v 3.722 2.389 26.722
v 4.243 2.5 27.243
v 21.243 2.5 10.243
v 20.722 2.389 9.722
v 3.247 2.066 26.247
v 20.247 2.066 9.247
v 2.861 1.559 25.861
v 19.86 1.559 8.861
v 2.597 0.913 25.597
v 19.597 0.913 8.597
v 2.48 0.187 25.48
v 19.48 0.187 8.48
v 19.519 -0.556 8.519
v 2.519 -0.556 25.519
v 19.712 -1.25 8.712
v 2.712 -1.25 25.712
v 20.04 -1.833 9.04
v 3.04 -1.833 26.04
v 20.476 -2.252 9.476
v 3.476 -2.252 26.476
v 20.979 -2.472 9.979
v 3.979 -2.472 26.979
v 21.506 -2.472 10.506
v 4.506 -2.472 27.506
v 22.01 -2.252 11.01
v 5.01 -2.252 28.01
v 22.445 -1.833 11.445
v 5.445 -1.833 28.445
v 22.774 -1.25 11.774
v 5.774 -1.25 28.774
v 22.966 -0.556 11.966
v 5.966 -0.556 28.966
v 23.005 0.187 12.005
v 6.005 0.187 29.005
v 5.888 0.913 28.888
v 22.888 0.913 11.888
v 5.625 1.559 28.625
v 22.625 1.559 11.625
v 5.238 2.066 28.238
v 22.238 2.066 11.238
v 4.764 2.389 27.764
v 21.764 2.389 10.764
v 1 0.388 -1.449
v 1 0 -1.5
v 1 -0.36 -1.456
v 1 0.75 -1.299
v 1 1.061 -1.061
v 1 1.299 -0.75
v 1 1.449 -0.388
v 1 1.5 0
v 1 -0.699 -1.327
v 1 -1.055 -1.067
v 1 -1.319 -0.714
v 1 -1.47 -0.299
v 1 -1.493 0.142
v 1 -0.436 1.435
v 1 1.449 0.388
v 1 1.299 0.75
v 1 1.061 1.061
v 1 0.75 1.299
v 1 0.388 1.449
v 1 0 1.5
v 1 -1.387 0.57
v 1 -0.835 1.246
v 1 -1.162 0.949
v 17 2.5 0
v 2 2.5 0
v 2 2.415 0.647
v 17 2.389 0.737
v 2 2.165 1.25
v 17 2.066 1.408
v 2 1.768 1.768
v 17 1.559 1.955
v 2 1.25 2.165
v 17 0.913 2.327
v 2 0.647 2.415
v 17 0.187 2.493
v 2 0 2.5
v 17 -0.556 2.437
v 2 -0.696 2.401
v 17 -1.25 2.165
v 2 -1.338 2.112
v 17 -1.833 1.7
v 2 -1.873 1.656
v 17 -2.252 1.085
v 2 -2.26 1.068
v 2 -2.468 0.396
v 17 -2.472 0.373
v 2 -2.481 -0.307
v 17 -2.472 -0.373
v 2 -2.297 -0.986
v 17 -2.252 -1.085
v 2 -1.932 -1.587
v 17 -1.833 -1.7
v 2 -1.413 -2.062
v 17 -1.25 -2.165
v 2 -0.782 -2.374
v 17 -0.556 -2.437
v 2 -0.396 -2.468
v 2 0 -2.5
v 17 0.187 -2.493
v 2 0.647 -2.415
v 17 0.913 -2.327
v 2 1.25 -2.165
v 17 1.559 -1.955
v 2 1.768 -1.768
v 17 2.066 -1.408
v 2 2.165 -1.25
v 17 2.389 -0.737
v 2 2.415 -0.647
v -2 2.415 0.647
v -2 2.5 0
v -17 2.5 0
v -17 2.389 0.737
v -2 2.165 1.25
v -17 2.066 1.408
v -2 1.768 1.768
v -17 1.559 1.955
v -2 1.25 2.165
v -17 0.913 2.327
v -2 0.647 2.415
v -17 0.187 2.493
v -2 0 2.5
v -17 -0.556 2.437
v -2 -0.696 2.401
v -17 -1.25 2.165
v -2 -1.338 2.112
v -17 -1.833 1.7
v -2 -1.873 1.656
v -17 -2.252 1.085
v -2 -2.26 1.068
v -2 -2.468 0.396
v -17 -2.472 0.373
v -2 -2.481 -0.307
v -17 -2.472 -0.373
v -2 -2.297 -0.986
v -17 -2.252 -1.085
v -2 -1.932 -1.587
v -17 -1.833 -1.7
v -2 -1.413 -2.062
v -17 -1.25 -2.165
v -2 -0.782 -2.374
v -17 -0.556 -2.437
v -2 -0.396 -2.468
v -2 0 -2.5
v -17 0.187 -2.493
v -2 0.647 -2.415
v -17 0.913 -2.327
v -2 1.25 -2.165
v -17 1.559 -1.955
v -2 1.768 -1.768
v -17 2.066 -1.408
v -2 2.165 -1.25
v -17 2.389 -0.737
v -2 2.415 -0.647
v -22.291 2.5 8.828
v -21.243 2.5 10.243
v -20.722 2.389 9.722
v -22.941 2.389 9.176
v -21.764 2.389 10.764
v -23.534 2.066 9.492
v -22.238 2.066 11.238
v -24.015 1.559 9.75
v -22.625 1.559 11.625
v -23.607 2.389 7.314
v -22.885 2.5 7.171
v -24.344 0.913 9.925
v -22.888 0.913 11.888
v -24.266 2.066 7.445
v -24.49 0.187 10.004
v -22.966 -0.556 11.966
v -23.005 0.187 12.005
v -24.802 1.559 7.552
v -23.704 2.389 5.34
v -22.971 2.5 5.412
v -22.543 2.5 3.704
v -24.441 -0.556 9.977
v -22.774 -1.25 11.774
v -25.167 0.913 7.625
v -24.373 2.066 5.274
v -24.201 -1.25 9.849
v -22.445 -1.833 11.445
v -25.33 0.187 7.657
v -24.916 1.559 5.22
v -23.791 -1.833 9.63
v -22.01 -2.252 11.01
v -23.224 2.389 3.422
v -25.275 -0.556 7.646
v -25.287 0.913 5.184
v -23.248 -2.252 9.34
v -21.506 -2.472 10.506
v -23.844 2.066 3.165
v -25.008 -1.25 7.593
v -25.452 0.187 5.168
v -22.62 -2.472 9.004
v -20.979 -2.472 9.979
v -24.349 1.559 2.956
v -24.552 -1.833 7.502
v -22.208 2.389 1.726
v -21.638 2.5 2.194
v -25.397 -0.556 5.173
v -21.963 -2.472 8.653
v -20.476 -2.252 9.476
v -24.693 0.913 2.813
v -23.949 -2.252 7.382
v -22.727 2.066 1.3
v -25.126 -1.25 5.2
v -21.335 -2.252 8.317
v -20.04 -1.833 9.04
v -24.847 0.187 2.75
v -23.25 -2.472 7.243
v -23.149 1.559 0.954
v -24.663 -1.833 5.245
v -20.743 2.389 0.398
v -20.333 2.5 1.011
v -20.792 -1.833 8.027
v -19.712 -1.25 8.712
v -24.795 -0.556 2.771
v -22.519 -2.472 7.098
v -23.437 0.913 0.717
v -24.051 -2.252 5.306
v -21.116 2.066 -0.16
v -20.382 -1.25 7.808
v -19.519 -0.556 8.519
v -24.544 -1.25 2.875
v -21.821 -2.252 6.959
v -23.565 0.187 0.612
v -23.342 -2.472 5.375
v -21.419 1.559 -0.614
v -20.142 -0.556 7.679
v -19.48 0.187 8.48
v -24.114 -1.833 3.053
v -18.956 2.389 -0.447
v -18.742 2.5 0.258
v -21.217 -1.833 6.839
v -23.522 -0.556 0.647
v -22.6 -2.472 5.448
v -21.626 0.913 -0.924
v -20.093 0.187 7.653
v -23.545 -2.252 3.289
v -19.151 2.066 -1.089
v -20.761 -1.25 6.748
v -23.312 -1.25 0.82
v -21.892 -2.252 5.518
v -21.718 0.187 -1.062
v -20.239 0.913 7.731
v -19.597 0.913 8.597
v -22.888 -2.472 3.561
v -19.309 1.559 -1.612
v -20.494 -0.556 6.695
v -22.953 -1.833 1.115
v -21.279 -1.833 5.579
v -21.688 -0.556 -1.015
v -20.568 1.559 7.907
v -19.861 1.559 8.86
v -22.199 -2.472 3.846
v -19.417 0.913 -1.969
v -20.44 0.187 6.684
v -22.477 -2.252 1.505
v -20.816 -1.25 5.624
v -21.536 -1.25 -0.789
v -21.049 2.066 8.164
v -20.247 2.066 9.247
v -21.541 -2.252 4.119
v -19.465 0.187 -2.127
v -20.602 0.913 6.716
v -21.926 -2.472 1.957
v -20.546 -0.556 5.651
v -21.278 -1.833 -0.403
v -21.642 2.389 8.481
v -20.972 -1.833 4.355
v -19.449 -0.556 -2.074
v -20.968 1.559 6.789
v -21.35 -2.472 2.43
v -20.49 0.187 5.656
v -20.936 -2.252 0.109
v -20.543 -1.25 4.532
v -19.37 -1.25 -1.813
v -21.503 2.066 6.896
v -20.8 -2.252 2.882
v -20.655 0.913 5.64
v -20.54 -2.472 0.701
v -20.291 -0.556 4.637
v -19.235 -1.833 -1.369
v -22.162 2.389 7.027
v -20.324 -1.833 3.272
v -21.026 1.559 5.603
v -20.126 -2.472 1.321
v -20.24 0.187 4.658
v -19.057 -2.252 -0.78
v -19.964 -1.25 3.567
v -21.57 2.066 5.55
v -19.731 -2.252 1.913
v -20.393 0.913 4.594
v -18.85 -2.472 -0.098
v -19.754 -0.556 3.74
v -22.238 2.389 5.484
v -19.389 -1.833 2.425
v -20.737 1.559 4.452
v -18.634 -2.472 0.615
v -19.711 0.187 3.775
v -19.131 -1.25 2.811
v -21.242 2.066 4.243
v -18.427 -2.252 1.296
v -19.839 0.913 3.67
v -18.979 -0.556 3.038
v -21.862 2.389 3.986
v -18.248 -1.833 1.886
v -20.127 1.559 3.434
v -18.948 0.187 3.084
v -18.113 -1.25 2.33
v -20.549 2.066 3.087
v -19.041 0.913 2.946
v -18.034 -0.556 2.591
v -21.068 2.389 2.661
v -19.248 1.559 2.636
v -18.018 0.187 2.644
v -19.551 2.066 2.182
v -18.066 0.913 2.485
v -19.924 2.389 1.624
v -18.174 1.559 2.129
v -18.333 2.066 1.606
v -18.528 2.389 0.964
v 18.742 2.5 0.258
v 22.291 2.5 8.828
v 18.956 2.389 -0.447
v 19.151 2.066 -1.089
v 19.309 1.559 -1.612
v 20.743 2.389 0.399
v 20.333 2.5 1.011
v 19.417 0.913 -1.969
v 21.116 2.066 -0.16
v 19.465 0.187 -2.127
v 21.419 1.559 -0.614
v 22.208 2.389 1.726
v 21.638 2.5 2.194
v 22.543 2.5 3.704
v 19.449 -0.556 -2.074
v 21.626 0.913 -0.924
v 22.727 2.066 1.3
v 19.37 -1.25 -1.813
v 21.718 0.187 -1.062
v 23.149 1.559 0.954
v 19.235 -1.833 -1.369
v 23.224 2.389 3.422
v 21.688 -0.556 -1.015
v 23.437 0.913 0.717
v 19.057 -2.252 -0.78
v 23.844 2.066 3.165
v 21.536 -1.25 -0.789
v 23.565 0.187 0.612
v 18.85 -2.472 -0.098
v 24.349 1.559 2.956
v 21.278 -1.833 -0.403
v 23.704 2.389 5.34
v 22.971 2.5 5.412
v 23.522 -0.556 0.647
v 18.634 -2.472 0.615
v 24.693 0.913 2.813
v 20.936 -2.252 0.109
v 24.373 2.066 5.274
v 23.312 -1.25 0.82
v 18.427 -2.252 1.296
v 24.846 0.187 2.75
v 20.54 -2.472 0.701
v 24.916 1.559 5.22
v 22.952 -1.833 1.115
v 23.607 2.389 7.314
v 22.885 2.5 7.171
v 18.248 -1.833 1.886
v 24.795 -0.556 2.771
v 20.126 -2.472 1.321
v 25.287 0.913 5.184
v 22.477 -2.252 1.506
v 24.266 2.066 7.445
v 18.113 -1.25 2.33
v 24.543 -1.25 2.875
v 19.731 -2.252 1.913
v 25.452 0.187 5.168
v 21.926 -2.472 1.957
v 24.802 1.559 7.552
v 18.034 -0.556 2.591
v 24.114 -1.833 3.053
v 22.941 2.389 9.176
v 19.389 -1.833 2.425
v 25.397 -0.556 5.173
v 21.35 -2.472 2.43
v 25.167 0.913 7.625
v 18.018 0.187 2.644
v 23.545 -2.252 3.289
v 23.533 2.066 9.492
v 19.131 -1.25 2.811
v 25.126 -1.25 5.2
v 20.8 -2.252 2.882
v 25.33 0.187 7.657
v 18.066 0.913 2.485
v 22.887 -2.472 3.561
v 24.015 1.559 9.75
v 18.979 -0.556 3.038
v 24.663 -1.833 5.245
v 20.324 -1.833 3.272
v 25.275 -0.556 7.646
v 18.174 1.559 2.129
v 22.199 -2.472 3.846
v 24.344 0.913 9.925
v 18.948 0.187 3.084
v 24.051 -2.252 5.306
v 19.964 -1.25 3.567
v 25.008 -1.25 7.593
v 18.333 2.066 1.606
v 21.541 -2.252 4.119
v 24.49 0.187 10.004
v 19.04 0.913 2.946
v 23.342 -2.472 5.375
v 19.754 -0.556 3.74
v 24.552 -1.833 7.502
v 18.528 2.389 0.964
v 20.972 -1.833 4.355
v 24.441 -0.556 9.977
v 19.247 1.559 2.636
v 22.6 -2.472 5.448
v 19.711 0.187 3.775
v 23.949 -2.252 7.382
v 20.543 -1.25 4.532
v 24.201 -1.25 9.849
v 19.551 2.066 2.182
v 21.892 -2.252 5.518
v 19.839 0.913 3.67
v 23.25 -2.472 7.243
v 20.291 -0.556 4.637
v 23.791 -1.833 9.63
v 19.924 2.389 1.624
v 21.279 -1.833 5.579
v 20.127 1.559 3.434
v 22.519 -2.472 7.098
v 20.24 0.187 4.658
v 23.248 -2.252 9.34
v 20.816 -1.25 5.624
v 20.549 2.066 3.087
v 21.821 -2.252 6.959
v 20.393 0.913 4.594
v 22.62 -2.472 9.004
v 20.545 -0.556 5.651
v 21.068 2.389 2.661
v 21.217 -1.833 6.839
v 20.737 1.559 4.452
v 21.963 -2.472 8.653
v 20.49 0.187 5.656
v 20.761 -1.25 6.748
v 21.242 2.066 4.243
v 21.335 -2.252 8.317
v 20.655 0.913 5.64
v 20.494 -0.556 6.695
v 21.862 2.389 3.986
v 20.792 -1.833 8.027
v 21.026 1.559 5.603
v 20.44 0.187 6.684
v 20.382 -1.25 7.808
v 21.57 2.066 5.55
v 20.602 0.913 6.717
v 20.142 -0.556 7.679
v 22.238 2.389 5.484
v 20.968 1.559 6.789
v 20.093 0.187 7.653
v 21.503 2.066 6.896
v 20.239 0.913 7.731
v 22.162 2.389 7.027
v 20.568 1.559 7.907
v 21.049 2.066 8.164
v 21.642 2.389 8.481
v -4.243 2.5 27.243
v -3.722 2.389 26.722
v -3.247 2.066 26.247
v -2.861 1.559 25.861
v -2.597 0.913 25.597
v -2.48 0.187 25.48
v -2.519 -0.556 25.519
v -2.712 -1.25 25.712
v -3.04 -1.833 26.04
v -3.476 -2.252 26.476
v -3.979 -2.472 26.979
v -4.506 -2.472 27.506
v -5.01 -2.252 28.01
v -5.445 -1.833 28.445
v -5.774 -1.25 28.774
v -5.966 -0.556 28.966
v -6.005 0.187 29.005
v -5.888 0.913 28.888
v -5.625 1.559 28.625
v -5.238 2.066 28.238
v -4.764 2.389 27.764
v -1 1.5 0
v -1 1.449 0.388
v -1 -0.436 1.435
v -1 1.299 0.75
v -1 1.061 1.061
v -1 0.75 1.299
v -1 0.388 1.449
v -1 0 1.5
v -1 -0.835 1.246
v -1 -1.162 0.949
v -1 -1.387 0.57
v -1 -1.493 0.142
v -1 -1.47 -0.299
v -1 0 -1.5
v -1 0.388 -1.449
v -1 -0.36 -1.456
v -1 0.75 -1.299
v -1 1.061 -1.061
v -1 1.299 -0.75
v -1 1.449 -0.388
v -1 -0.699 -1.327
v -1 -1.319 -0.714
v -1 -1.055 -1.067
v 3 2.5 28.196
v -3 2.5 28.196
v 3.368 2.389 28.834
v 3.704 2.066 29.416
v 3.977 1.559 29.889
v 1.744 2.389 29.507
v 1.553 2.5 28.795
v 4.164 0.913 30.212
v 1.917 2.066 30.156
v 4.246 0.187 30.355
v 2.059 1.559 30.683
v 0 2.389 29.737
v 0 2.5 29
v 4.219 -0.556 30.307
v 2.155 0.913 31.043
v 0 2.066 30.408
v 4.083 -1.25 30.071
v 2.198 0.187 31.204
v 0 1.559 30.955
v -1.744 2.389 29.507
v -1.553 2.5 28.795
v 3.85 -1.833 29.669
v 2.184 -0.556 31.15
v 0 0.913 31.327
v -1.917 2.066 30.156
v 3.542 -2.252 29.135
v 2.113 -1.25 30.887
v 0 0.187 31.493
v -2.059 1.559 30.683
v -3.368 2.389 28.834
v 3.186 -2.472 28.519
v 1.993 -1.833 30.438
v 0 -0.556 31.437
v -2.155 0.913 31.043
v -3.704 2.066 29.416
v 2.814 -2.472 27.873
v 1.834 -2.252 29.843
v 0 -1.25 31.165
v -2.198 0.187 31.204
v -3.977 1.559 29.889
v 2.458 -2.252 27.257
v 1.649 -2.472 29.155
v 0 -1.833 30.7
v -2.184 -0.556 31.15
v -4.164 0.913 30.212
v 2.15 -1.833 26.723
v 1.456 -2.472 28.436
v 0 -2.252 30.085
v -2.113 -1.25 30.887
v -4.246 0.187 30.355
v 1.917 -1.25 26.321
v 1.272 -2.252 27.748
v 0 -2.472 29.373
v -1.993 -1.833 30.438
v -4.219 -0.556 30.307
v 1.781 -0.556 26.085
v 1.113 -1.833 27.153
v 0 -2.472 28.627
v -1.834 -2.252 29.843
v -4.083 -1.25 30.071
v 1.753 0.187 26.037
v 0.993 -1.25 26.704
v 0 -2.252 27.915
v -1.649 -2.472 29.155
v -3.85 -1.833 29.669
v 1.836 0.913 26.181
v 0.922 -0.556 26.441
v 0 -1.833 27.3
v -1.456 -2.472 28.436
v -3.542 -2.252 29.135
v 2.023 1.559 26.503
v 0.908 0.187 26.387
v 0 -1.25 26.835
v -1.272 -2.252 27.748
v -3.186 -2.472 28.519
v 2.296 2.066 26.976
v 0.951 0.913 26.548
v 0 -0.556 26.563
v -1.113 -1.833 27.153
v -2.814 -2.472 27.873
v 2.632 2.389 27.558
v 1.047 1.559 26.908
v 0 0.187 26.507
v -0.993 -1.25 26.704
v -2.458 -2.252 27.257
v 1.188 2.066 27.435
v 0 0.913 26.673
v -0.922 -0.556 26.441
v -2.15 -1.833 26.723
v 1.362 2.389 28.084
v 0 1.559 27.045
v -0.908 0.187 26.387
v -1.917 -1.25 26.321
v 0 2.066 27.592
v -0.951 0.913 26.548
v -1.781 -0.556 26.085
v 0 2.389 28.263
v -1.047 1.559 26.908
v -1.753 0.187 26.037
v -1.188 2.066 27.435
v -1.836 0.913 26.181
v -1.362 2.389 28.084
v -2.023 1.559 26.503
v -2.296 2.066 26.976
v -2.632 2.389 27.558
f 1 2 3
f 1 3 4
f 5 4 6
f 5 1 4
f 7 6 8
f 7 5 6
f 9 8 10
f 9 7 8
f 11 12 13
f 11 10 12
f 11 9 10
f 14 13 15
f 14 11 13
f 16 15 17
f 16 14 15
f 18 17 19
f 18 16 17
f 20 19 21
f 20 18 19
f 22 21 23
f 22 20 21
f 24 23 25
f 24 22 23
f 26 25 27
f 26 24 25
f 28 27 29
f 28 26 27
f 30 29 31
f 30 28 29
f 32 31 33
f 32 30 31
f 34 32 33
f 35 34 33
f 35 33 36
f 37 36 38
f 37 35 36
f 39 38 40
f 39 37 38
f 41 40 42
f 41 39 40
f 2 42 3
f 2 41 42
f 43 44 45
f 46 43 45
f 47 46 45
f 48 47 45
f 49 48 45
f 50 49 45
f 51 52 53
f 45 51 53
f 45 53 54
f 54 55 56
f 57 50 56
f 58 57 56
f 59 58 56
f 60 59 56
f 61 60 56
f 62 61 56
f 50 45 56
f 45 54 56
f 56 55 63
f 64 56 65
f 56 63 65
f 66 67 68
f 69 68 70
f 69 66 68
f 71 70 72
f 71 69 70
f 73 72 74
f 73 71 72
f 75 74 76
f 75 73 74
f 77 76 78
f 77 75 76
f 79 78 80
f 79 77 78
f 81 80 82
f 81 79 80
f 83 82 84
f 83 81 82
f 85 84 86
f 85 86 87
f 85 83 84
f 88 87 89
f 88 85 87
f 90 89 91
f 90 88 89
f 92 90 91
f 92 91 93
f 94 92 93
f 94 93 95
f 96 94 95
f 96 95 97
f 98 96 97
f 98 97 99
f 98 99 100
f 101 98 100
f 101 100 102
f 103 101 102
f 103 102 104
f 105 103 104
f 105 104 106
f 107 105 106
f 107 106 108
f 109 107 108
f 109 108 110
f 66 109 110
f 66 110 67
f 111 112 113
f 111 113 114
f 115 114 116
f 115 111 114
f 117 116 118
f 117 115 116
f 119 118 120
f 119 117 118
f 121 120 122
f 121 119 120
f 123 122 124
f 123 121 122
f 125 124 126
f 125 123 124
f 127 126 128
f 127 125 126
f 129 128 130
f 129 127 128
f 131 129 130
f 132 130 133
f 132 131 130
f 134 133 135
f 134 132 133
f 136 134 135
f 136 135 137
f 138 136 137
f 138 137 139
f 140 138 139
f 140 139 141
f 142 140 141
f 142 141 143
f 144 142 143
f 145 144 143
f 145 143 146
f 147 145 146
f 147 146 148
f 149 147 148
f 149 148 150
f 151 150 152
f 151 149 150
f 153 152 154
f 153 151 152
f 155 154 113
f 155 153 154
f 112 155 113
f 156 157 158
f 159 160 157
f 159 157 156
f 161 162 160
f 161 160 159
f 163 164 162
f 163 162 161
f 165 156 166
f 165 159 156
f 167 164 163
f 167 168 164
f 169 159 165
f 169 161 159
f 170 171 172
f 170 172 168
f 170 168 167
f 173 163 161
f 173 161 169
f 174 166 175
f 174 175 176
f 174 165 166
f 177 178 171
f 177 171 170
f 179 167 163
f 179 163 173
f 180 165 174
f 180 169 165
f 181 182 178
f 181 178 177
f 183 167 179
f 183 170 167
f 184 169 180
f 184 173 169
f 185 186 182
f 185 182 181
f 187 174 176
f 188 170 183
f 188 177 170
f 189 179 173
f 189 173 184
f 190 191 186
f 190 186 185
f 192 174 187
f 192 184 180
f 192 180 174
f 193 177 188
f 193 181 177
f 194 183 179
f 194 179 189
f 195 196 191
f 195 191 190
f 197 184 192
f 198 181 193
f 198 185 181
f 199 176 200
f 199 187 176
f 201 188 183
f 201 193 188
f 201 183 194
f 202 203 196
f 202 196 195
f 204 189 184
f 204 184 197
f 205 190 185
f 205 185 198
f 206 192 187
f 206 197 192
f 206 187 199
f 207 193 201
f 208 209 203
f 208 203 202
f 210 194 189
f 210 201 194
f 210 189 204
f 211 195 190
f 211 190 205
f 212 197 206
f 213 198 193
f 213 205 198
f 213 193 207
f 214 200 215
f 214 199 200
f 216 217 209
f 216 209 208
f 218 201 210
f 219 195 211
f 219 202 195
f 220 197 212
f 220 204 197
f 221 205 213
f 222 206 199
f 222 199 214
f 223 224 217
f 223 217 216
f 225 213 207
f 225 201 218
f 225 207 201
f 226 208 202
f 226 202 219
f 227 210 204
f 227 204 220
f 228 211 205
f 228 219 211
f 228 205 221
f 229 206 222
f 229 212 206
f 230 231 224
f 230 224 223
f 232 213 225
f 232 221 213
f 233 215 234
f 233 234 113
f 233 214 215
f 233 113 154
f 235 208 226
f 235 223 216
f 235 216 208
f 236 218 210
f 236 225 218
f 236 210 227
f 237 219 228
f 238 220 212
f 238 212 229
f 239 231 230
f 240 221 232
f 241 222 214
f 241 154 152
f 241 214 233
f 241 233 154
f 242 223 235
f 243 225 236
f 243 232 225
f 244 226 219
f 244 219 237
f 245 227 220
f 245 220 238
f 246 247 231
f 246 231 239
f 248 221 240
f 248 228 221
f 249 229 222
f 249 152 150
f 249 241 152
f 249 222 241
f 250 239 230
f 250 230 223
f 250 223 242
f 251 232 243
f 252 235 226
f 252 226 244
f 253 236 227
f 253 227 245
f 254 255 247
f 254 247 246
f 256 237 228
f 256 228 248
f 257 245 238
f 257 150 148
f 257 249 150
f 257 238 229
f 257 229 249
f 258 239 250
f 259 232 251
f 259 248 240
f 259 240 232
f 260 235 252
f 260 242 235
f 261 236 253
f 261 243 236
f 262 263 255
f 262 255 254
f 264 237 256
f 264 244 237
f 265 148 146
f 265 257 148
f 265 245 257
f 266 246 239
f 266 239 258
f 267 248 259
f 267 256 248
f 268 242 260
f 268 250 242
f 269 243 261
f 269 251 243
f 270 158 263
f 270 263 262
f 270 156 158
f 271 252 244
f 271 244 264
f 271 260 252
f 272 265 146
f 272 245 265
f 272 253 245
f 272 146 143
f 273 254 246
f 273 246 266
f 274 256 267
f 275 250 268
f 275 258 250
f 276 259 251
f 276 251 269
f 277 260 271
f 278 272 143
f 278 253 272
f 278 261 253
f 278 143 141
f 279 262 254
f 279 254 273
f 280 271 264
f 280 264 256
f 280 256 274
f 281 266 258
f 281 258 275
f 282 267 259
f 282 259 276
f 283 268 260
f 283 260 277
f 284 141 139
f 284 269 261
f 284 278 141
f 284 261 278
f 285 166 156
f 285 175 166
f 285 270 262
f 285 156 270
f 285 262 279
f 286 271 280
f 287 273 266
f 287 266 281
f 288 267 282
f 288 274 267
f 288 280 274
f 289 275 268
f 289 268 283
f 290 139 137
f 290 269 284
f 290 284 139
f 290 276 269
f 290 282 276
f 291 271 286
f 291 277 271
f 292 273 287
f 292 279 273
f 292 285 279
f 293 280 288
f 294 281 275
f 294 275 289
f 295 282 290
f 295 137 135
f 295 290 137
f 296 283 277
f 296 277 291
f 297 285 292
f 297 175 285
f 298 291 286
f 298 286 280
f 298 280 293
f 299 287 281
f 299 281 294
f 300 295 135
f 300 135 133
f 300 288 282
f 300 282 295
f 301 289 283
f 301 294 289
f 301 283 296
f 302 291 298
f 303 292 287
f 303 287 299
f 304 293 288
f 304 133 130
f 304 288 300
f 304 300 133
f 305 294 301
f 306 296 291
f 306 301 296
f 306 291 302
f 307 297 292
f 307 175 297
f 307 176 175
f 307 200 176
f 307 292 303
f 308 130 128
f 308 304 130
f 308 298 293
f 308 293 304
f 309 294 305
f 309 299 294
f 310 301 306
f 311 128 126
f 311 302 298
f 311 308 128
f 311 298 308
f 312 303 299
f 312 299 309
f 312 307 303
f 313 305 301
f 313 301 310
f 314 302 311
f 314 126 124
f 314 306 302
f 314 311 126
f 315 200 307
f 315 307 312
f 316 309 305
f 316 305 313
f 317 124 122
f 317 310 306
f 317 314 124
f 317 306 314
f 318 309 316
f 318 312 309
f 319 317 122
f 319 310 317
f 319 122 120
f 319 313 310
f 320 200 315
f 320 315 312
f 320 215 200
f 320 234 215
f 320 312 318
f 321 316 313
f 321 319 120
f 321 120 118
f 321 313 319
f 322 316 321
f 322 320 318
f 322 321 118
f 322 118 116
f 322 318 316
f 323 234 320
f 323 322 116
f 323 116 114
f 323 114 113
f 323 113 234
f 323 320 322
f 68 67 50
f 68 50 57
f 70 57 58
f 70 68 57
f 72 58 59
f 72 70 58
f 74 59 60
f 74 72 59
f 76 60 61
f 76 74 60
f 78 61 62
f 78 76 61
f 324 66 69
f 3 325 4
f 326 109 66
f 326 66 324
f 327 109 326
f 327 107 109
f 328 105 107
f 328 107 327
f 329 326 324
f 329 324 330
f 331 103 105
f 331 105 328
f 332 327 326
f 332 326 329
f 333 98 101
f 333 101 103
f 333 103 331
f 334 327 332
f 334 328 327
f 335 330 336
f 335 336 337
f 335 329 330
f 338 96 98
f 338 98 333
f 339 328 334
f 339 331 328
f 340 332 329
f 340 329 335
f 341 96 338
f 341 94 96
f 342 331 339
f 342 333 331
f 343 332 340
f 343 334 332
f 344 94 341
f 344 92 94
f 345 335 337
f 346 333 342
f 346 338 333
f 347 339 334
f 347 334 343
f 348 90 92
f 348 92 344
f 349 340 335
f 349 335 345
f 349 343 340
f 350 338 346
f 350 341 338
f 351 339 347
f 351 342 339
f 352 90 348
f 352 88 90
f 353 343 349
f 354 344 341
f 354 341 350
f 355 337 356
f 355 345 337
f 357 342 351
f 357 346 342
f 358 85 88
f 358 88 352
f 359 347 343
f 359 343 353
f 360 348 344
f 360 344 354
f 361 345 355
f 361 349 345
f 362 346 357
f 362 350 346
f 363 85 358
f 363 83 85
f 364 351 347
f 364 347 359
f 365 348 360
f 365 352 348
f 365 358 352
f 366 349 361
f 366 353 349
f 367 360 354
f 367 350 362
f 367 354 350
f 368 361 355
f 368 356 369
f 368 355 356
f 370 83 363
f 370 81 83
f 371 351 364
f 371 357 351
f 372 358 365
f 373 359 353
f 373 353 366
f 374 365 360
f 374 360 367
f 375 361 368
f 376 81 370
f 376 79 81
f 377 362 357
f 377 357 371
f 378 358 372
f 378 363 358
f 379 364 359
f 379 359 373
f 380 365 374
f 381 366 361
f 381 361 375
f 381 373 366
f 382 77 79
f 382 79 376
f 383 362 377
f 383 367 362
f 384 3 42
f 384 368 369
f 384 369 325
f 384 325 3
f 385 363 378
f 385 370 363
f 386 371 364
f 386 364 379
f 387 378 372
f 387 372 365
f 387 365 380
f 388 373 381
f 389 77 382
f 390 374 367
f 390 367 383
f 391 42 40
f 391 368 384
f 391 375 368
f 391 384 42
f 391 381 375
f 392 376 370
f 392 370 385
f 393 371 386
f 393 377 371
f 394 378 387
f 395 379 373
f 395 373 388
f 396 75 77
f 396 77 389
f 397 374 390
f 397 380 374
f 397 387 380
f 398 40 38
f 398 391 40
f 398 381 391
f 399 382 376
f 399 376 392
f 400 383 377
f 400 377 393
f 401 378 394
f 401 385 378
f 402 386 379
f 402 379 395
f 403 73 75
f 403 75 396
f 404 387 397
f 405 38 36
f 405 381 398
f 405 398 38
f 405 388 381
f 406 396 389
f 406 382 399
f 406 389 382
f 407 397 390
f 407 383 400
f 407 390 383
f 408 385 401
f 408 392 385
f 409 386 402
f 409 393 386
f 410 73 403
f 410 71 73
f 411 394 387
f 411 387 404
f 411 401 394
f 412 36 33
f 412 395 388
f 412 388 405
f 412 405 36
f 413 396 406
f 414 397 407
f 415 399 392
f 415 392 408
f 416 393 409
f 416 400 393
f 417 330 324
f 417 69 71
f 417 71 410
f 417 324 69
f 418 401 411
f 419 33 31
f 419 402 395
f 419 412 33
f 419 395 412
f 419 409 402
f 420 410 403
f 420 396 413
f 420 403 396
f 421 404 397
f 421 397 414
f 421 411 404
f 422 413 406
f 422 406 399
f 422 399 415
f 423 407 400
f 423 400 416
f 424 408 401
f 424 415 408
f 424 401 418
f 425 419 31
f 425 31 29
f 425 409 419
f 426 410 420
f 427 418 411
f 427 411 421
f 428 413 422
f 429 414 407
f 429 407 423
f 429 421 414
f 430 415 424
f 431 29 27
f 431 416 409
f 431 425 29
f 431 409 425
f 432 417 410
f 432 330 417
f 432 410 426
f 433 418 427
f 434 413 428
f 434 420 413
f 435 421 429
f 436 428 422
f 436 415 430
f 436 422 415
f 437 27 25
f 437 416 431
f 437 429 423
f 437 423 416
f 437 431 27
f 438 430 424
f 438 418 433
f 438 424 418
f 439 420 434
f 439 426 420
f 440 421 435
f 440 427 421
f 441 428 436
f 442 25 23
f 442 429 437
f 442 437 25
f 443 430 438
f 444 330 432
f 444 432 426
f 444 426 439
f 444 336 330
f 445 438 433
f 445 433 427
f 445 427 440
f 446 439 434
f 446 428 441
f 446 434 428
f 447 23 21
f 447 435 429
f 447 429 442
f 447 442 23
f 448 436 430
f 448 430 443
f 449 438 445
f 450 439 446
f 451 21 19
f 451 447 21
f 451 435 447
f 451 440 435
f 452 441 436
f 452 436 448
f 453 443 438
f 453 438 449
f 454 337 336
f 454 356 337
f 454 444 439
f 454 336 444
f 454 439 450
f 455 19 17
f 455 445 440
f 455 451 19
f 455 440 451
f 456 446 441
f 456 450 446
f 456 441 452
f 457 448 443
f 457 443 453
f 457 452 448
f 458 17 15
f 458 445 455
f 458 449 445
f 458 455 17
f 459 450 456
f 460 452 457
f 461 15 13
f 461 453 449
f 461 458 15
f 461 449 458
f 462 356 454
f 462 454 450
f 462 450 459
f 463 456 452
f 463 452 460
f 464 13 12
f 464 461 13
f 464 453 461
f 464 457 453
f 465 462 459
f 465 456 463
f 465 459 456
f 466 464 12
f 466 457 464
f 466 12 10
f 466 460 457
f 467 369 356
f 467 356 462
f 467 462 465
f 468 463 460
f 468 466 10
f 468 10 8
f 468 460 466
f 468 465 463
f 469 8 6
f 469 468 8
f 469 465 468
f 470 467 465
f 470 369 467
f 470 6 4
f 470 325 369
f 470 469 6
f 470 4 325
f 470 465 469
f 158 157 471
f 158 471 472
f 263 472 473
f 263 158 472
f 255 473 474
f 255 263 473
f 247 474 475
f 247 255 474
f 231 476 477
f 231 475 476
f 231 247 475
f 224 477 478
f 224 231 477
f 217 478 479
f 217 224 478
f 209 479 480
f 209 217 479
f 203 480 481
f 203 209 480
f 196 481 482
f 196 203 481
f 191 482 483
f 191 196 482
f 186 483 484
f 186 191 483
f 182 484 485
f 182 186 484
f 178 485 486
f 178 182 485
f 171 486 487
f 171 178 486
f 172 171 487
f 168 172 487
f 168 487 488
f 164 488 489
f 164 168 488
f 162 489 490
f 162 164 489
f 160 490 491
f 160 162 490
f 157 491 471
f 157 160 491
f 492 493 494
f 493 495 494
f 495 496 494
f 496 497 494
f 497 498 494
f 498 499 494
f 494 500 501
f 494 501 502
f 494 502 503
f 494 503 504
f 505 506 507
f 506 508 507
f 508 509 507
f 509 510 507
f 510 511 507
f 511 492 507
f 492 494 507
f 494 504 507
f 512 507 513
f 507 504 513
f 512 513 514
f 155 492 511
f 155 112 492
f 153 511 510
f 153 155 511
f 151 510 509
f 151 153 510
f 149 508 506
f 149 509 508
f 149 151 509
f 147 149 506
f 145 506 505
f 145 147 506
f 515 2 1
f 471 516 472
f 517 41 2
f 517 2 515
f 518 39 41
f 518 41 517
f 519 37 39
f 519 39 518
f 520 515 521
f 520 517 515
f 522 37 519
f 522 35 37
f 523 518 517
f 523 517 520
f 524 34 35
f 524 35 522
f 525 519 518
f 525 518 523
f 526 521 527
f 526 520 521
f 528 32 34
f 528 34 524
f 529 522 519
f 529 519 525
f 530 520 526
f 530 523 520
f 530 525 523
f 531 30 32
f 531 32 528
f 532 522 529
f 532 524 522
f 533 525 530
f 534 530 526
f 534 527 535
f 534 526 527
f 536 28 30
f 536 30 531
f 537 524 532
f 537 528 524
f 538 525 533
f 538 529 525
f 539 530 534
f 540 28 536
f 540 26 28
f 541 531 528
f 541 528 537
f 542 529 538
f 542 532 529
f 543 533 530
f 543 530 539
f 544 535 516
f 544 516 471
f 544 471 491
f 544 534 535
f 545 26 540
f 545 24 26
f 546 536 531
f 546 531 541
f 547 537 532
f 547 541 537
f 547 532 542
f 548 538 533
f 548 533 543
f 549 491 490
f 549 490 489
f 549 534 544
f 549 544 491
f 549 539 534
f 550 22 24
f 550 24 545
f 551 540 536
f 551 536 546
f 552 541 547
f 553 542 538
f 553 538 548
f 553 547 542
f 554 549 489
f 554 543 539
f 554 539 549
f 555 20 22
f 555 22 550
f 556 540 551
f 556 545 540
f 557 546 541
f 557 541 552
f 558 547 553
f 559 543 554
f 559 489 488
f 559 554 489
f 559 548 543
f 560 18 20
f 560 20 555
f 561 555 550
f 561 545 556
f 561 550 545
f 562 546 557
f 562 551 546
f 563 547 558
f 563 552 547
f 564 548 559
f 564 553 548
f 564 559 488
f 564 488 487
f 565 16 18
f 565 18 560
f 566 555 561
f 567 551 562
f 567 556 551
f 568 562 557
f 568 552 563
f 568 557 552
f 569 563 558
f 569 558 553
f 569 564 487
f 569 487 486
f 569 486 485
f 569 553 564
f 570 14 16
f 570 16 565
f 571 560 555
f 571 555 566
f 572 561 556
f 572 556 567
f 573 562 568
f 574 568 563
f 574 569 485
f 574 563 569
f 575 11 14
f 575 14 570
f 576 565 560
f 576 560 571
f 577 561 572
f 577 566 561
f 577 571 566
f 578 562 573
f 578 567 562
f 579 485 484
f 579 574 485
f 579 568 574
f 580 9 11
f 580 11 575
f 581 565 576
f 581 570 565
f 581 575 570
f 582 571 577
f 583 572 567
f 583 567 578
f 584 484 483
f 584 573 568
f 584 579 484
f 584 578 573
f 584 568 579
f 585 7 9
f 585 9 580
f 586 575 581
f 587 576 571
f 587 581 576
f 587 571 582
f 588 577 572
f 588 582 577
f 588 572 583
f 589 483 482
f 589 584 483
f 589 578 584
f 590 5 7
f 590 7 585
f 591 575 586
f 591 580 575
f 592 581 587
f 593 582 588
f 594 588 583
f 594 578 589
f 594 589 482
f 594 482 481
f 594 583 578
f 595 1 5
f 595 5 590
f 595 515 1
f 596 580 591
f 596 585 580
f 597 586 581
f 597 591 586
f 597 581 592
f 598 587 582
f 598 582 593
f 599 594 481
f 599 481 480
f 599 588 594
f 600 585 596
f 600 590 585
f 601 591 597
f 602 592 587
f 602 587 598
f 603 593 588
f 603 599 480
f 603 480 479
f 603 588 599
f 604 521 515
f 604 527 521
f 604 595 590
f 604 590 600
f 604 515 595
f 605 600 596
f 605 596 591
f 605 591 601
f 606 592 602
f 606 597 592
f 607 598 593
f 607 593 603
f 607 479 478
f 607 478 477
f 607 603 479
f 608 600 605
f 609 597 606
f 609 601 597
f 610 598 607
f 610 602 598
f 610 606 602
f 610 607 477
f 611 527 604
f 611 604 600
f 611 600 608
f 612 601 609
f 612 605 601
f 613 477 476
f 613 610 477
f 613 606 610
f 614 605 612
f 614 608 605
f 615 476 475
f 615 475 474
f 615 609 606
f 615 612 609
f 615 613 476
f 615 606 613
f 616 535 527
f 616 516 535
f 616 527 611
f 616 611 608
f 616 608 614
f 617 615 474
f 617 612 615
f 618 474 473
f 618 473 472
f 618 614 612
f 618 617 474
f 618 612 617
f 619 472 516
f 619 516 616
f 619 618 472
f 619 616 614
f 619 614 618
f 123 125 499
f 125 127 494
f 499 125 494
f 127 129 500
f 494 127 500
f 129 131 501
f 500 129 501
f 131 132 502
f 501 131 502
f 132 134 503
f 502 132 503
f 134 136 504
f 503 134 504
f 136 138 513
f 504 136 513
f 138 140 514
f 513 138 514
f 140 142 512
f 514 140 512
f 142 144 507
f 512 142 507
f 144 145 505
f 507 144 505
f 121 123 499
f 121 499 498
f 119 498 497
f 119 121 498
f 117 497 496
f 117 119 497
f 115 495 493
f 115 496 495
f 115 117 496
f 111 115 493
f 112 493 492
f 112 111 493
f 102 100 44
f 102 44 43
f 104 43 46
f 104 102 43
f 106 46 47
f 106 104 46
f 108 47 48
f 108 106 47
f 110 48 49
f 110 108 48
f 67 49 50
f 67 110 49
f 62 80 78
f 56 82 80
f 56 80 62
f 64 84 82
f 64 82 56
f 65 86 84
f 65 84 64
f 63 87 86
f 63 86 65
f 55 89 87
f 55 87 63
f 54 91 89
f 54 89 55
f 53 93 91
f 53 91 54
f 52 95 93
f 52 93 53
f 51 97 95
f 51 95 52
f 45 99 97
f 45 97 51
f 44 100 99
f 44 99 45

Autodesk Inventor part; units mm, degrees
ref_plane "YZ Plane" through (0, 0, 0) normal (1, 0, 0) x (0, 1, 0)
ref_plane "XZ Plane" through (0, 0, 0) normal (0, 1, 0) x (-1, 0, 0)
ref_plane "XY Plane" through (0, 0, 0) normal (0, 0, 1) x (1, 0, 0)
sketch "Náčrt2" plane through (0, 0, 0) normal (0, 1, 0) x (-1, 0, 0)
  line L0 (-15, 3.4854) -> (17, 3.4854) construction
  line L1 (17, 3.4854) -> (17, 9.4853) construction
  line L2 (17, 9.4853) -> (-15, 9.4853) construction
  line L3 (20.5, 23.4853) -> (39.8276, 23.4853) construction
  line L4 (20.5, 23.4853) -> (20.5, 35.0341) construction
  line L5 (4.2426, 27.2426) -> (21.2426, 10.2426)
  line L6 (17, 0) -> (-17, 0)
  line L7 (-4.2426, 27.2426) -> (-21.2426, 10.2426)
  line L8 (0, 9.4853) -> (0, 31.4853) construction
  arc A0 (4.2426, 27.2426) -> (-4.2426, 27.2426) centre (0, 23) ccw
  arc A1 (17, 0) -> (21.2426, 10.2426) centre (17, 6) ccw
  arc A2 (-21.2426, 10.2426) -> (-17, 0) centre (-17, 6) ccw
  line L9 (19.1213, 8.1213) -> (2.1213, 25.1213) construction
  arc A3 (2.1213, 25.1213) -> (-2.1213, 25.1213) centre (0, 23) ccw construction
  line L10 (-2.1213, 25.1213) -> (-19.1213, 8.1213) construction
  arc A4 (-19.1213, 8.1213) -> (-17, 3) centre (-17, 6) ccw construction
  line L11 (-17, 3) -> (17, 3) construction
  arc A5 (17, 3) -> (19.1213, 8.1213) centre (17, 6) ccw construction
  line L12 (23.364, 12.364) -> (6.364, 29.364) construction
  arc A6 (6.364, 29.364) -> (-6.364, 29.364) centre (0, 23) ccw construction
  line L13 (-6.364, 29.364) -> (-23.364, 12.364) construction
  arc A7 (-23.364, 12.364) -> (-17, -3) centre (-17, 6) ccw construction
  line L14 (-17, -3) -> (17, -3) construction
  arc A8 (17, -3) -> (23.364, 12.364) centre (17, 6) ccw construction
  circle A9 centre (0, 20.4853) radius 3 construction
  line L15 (0, 9.4853) -> (0, 0) construction
  line L16 (36.2885, 20.7337) -> (33.8584, 23.4853) construction
  line L17 (0, 20.4853) -> (20.2426, 20.4853) construction
  line L18 (-15, 3.4854) -> (-15, 9.4853) construction
  point P0 (0, 0)
  dimension "d5" = 45
  dimension "d6" = 45
  dimension "d7" = 6
  dimension "d8" = 3
  dimension "d9" = 3
  dimension "d10" = 6
  dimension "d12" = 32
  dimension "d13" = 5.9999
  dimension "d23" = 20.5
  dimension "d26" = 34
  dimension "d27" = 14
  dimension "d28" = 3
sketch "Náčrt3" plane through (0, 0, 0) normal (1, 0, 0) x (0, 1, 0)
  circle A0 centre (0, 0) radius 2.5
  dimension "d14" = 5
sweep "Tažení1" add profiles "Náčrt3" path "Náčrt2"
sketch "Náčrt4" plane through (0, 0, 0) normal (0, 1, 0) x (-1, 0, 0)
  line L0 (17, -2.5) -> (17, 2.5) projected
  line L1 (-17, -2.5) -> (-17, 2.5) projected
  line L2 (-17, 2.5) -> (17, 2.5) projected
  line L3 (-17, -2.5) -> (17, -2.5) projected
  line L4 (-1, 2.5) -> (1, 2.5)
  line L5 (1, 2.5) -> (1, -2.5)
  line L6 (1, -2.5) -> (-1, -2.5)
  line L7 (-1, -2.5) -> (-1, 2.5)
  point P0 (0, 0)
  point P1 (0, 2.5)
  point P2 (0, 2.5)
  point P3 (0, -2.5)
  point P4 (0, -2.5)
  dimension "d17" = 2
extrude "Vysunutí1" cut sketch "Náčrt4" along normal through all both and the other way through all contours L3 L7 L2 L5
chamfer "Zkosení1" distance 1 angle 45 2 edges at (-1, -2.5, 0) (1, -2.5, 0)
properties part number "DD_KVD_002_12" material "Nerezová ocel"
